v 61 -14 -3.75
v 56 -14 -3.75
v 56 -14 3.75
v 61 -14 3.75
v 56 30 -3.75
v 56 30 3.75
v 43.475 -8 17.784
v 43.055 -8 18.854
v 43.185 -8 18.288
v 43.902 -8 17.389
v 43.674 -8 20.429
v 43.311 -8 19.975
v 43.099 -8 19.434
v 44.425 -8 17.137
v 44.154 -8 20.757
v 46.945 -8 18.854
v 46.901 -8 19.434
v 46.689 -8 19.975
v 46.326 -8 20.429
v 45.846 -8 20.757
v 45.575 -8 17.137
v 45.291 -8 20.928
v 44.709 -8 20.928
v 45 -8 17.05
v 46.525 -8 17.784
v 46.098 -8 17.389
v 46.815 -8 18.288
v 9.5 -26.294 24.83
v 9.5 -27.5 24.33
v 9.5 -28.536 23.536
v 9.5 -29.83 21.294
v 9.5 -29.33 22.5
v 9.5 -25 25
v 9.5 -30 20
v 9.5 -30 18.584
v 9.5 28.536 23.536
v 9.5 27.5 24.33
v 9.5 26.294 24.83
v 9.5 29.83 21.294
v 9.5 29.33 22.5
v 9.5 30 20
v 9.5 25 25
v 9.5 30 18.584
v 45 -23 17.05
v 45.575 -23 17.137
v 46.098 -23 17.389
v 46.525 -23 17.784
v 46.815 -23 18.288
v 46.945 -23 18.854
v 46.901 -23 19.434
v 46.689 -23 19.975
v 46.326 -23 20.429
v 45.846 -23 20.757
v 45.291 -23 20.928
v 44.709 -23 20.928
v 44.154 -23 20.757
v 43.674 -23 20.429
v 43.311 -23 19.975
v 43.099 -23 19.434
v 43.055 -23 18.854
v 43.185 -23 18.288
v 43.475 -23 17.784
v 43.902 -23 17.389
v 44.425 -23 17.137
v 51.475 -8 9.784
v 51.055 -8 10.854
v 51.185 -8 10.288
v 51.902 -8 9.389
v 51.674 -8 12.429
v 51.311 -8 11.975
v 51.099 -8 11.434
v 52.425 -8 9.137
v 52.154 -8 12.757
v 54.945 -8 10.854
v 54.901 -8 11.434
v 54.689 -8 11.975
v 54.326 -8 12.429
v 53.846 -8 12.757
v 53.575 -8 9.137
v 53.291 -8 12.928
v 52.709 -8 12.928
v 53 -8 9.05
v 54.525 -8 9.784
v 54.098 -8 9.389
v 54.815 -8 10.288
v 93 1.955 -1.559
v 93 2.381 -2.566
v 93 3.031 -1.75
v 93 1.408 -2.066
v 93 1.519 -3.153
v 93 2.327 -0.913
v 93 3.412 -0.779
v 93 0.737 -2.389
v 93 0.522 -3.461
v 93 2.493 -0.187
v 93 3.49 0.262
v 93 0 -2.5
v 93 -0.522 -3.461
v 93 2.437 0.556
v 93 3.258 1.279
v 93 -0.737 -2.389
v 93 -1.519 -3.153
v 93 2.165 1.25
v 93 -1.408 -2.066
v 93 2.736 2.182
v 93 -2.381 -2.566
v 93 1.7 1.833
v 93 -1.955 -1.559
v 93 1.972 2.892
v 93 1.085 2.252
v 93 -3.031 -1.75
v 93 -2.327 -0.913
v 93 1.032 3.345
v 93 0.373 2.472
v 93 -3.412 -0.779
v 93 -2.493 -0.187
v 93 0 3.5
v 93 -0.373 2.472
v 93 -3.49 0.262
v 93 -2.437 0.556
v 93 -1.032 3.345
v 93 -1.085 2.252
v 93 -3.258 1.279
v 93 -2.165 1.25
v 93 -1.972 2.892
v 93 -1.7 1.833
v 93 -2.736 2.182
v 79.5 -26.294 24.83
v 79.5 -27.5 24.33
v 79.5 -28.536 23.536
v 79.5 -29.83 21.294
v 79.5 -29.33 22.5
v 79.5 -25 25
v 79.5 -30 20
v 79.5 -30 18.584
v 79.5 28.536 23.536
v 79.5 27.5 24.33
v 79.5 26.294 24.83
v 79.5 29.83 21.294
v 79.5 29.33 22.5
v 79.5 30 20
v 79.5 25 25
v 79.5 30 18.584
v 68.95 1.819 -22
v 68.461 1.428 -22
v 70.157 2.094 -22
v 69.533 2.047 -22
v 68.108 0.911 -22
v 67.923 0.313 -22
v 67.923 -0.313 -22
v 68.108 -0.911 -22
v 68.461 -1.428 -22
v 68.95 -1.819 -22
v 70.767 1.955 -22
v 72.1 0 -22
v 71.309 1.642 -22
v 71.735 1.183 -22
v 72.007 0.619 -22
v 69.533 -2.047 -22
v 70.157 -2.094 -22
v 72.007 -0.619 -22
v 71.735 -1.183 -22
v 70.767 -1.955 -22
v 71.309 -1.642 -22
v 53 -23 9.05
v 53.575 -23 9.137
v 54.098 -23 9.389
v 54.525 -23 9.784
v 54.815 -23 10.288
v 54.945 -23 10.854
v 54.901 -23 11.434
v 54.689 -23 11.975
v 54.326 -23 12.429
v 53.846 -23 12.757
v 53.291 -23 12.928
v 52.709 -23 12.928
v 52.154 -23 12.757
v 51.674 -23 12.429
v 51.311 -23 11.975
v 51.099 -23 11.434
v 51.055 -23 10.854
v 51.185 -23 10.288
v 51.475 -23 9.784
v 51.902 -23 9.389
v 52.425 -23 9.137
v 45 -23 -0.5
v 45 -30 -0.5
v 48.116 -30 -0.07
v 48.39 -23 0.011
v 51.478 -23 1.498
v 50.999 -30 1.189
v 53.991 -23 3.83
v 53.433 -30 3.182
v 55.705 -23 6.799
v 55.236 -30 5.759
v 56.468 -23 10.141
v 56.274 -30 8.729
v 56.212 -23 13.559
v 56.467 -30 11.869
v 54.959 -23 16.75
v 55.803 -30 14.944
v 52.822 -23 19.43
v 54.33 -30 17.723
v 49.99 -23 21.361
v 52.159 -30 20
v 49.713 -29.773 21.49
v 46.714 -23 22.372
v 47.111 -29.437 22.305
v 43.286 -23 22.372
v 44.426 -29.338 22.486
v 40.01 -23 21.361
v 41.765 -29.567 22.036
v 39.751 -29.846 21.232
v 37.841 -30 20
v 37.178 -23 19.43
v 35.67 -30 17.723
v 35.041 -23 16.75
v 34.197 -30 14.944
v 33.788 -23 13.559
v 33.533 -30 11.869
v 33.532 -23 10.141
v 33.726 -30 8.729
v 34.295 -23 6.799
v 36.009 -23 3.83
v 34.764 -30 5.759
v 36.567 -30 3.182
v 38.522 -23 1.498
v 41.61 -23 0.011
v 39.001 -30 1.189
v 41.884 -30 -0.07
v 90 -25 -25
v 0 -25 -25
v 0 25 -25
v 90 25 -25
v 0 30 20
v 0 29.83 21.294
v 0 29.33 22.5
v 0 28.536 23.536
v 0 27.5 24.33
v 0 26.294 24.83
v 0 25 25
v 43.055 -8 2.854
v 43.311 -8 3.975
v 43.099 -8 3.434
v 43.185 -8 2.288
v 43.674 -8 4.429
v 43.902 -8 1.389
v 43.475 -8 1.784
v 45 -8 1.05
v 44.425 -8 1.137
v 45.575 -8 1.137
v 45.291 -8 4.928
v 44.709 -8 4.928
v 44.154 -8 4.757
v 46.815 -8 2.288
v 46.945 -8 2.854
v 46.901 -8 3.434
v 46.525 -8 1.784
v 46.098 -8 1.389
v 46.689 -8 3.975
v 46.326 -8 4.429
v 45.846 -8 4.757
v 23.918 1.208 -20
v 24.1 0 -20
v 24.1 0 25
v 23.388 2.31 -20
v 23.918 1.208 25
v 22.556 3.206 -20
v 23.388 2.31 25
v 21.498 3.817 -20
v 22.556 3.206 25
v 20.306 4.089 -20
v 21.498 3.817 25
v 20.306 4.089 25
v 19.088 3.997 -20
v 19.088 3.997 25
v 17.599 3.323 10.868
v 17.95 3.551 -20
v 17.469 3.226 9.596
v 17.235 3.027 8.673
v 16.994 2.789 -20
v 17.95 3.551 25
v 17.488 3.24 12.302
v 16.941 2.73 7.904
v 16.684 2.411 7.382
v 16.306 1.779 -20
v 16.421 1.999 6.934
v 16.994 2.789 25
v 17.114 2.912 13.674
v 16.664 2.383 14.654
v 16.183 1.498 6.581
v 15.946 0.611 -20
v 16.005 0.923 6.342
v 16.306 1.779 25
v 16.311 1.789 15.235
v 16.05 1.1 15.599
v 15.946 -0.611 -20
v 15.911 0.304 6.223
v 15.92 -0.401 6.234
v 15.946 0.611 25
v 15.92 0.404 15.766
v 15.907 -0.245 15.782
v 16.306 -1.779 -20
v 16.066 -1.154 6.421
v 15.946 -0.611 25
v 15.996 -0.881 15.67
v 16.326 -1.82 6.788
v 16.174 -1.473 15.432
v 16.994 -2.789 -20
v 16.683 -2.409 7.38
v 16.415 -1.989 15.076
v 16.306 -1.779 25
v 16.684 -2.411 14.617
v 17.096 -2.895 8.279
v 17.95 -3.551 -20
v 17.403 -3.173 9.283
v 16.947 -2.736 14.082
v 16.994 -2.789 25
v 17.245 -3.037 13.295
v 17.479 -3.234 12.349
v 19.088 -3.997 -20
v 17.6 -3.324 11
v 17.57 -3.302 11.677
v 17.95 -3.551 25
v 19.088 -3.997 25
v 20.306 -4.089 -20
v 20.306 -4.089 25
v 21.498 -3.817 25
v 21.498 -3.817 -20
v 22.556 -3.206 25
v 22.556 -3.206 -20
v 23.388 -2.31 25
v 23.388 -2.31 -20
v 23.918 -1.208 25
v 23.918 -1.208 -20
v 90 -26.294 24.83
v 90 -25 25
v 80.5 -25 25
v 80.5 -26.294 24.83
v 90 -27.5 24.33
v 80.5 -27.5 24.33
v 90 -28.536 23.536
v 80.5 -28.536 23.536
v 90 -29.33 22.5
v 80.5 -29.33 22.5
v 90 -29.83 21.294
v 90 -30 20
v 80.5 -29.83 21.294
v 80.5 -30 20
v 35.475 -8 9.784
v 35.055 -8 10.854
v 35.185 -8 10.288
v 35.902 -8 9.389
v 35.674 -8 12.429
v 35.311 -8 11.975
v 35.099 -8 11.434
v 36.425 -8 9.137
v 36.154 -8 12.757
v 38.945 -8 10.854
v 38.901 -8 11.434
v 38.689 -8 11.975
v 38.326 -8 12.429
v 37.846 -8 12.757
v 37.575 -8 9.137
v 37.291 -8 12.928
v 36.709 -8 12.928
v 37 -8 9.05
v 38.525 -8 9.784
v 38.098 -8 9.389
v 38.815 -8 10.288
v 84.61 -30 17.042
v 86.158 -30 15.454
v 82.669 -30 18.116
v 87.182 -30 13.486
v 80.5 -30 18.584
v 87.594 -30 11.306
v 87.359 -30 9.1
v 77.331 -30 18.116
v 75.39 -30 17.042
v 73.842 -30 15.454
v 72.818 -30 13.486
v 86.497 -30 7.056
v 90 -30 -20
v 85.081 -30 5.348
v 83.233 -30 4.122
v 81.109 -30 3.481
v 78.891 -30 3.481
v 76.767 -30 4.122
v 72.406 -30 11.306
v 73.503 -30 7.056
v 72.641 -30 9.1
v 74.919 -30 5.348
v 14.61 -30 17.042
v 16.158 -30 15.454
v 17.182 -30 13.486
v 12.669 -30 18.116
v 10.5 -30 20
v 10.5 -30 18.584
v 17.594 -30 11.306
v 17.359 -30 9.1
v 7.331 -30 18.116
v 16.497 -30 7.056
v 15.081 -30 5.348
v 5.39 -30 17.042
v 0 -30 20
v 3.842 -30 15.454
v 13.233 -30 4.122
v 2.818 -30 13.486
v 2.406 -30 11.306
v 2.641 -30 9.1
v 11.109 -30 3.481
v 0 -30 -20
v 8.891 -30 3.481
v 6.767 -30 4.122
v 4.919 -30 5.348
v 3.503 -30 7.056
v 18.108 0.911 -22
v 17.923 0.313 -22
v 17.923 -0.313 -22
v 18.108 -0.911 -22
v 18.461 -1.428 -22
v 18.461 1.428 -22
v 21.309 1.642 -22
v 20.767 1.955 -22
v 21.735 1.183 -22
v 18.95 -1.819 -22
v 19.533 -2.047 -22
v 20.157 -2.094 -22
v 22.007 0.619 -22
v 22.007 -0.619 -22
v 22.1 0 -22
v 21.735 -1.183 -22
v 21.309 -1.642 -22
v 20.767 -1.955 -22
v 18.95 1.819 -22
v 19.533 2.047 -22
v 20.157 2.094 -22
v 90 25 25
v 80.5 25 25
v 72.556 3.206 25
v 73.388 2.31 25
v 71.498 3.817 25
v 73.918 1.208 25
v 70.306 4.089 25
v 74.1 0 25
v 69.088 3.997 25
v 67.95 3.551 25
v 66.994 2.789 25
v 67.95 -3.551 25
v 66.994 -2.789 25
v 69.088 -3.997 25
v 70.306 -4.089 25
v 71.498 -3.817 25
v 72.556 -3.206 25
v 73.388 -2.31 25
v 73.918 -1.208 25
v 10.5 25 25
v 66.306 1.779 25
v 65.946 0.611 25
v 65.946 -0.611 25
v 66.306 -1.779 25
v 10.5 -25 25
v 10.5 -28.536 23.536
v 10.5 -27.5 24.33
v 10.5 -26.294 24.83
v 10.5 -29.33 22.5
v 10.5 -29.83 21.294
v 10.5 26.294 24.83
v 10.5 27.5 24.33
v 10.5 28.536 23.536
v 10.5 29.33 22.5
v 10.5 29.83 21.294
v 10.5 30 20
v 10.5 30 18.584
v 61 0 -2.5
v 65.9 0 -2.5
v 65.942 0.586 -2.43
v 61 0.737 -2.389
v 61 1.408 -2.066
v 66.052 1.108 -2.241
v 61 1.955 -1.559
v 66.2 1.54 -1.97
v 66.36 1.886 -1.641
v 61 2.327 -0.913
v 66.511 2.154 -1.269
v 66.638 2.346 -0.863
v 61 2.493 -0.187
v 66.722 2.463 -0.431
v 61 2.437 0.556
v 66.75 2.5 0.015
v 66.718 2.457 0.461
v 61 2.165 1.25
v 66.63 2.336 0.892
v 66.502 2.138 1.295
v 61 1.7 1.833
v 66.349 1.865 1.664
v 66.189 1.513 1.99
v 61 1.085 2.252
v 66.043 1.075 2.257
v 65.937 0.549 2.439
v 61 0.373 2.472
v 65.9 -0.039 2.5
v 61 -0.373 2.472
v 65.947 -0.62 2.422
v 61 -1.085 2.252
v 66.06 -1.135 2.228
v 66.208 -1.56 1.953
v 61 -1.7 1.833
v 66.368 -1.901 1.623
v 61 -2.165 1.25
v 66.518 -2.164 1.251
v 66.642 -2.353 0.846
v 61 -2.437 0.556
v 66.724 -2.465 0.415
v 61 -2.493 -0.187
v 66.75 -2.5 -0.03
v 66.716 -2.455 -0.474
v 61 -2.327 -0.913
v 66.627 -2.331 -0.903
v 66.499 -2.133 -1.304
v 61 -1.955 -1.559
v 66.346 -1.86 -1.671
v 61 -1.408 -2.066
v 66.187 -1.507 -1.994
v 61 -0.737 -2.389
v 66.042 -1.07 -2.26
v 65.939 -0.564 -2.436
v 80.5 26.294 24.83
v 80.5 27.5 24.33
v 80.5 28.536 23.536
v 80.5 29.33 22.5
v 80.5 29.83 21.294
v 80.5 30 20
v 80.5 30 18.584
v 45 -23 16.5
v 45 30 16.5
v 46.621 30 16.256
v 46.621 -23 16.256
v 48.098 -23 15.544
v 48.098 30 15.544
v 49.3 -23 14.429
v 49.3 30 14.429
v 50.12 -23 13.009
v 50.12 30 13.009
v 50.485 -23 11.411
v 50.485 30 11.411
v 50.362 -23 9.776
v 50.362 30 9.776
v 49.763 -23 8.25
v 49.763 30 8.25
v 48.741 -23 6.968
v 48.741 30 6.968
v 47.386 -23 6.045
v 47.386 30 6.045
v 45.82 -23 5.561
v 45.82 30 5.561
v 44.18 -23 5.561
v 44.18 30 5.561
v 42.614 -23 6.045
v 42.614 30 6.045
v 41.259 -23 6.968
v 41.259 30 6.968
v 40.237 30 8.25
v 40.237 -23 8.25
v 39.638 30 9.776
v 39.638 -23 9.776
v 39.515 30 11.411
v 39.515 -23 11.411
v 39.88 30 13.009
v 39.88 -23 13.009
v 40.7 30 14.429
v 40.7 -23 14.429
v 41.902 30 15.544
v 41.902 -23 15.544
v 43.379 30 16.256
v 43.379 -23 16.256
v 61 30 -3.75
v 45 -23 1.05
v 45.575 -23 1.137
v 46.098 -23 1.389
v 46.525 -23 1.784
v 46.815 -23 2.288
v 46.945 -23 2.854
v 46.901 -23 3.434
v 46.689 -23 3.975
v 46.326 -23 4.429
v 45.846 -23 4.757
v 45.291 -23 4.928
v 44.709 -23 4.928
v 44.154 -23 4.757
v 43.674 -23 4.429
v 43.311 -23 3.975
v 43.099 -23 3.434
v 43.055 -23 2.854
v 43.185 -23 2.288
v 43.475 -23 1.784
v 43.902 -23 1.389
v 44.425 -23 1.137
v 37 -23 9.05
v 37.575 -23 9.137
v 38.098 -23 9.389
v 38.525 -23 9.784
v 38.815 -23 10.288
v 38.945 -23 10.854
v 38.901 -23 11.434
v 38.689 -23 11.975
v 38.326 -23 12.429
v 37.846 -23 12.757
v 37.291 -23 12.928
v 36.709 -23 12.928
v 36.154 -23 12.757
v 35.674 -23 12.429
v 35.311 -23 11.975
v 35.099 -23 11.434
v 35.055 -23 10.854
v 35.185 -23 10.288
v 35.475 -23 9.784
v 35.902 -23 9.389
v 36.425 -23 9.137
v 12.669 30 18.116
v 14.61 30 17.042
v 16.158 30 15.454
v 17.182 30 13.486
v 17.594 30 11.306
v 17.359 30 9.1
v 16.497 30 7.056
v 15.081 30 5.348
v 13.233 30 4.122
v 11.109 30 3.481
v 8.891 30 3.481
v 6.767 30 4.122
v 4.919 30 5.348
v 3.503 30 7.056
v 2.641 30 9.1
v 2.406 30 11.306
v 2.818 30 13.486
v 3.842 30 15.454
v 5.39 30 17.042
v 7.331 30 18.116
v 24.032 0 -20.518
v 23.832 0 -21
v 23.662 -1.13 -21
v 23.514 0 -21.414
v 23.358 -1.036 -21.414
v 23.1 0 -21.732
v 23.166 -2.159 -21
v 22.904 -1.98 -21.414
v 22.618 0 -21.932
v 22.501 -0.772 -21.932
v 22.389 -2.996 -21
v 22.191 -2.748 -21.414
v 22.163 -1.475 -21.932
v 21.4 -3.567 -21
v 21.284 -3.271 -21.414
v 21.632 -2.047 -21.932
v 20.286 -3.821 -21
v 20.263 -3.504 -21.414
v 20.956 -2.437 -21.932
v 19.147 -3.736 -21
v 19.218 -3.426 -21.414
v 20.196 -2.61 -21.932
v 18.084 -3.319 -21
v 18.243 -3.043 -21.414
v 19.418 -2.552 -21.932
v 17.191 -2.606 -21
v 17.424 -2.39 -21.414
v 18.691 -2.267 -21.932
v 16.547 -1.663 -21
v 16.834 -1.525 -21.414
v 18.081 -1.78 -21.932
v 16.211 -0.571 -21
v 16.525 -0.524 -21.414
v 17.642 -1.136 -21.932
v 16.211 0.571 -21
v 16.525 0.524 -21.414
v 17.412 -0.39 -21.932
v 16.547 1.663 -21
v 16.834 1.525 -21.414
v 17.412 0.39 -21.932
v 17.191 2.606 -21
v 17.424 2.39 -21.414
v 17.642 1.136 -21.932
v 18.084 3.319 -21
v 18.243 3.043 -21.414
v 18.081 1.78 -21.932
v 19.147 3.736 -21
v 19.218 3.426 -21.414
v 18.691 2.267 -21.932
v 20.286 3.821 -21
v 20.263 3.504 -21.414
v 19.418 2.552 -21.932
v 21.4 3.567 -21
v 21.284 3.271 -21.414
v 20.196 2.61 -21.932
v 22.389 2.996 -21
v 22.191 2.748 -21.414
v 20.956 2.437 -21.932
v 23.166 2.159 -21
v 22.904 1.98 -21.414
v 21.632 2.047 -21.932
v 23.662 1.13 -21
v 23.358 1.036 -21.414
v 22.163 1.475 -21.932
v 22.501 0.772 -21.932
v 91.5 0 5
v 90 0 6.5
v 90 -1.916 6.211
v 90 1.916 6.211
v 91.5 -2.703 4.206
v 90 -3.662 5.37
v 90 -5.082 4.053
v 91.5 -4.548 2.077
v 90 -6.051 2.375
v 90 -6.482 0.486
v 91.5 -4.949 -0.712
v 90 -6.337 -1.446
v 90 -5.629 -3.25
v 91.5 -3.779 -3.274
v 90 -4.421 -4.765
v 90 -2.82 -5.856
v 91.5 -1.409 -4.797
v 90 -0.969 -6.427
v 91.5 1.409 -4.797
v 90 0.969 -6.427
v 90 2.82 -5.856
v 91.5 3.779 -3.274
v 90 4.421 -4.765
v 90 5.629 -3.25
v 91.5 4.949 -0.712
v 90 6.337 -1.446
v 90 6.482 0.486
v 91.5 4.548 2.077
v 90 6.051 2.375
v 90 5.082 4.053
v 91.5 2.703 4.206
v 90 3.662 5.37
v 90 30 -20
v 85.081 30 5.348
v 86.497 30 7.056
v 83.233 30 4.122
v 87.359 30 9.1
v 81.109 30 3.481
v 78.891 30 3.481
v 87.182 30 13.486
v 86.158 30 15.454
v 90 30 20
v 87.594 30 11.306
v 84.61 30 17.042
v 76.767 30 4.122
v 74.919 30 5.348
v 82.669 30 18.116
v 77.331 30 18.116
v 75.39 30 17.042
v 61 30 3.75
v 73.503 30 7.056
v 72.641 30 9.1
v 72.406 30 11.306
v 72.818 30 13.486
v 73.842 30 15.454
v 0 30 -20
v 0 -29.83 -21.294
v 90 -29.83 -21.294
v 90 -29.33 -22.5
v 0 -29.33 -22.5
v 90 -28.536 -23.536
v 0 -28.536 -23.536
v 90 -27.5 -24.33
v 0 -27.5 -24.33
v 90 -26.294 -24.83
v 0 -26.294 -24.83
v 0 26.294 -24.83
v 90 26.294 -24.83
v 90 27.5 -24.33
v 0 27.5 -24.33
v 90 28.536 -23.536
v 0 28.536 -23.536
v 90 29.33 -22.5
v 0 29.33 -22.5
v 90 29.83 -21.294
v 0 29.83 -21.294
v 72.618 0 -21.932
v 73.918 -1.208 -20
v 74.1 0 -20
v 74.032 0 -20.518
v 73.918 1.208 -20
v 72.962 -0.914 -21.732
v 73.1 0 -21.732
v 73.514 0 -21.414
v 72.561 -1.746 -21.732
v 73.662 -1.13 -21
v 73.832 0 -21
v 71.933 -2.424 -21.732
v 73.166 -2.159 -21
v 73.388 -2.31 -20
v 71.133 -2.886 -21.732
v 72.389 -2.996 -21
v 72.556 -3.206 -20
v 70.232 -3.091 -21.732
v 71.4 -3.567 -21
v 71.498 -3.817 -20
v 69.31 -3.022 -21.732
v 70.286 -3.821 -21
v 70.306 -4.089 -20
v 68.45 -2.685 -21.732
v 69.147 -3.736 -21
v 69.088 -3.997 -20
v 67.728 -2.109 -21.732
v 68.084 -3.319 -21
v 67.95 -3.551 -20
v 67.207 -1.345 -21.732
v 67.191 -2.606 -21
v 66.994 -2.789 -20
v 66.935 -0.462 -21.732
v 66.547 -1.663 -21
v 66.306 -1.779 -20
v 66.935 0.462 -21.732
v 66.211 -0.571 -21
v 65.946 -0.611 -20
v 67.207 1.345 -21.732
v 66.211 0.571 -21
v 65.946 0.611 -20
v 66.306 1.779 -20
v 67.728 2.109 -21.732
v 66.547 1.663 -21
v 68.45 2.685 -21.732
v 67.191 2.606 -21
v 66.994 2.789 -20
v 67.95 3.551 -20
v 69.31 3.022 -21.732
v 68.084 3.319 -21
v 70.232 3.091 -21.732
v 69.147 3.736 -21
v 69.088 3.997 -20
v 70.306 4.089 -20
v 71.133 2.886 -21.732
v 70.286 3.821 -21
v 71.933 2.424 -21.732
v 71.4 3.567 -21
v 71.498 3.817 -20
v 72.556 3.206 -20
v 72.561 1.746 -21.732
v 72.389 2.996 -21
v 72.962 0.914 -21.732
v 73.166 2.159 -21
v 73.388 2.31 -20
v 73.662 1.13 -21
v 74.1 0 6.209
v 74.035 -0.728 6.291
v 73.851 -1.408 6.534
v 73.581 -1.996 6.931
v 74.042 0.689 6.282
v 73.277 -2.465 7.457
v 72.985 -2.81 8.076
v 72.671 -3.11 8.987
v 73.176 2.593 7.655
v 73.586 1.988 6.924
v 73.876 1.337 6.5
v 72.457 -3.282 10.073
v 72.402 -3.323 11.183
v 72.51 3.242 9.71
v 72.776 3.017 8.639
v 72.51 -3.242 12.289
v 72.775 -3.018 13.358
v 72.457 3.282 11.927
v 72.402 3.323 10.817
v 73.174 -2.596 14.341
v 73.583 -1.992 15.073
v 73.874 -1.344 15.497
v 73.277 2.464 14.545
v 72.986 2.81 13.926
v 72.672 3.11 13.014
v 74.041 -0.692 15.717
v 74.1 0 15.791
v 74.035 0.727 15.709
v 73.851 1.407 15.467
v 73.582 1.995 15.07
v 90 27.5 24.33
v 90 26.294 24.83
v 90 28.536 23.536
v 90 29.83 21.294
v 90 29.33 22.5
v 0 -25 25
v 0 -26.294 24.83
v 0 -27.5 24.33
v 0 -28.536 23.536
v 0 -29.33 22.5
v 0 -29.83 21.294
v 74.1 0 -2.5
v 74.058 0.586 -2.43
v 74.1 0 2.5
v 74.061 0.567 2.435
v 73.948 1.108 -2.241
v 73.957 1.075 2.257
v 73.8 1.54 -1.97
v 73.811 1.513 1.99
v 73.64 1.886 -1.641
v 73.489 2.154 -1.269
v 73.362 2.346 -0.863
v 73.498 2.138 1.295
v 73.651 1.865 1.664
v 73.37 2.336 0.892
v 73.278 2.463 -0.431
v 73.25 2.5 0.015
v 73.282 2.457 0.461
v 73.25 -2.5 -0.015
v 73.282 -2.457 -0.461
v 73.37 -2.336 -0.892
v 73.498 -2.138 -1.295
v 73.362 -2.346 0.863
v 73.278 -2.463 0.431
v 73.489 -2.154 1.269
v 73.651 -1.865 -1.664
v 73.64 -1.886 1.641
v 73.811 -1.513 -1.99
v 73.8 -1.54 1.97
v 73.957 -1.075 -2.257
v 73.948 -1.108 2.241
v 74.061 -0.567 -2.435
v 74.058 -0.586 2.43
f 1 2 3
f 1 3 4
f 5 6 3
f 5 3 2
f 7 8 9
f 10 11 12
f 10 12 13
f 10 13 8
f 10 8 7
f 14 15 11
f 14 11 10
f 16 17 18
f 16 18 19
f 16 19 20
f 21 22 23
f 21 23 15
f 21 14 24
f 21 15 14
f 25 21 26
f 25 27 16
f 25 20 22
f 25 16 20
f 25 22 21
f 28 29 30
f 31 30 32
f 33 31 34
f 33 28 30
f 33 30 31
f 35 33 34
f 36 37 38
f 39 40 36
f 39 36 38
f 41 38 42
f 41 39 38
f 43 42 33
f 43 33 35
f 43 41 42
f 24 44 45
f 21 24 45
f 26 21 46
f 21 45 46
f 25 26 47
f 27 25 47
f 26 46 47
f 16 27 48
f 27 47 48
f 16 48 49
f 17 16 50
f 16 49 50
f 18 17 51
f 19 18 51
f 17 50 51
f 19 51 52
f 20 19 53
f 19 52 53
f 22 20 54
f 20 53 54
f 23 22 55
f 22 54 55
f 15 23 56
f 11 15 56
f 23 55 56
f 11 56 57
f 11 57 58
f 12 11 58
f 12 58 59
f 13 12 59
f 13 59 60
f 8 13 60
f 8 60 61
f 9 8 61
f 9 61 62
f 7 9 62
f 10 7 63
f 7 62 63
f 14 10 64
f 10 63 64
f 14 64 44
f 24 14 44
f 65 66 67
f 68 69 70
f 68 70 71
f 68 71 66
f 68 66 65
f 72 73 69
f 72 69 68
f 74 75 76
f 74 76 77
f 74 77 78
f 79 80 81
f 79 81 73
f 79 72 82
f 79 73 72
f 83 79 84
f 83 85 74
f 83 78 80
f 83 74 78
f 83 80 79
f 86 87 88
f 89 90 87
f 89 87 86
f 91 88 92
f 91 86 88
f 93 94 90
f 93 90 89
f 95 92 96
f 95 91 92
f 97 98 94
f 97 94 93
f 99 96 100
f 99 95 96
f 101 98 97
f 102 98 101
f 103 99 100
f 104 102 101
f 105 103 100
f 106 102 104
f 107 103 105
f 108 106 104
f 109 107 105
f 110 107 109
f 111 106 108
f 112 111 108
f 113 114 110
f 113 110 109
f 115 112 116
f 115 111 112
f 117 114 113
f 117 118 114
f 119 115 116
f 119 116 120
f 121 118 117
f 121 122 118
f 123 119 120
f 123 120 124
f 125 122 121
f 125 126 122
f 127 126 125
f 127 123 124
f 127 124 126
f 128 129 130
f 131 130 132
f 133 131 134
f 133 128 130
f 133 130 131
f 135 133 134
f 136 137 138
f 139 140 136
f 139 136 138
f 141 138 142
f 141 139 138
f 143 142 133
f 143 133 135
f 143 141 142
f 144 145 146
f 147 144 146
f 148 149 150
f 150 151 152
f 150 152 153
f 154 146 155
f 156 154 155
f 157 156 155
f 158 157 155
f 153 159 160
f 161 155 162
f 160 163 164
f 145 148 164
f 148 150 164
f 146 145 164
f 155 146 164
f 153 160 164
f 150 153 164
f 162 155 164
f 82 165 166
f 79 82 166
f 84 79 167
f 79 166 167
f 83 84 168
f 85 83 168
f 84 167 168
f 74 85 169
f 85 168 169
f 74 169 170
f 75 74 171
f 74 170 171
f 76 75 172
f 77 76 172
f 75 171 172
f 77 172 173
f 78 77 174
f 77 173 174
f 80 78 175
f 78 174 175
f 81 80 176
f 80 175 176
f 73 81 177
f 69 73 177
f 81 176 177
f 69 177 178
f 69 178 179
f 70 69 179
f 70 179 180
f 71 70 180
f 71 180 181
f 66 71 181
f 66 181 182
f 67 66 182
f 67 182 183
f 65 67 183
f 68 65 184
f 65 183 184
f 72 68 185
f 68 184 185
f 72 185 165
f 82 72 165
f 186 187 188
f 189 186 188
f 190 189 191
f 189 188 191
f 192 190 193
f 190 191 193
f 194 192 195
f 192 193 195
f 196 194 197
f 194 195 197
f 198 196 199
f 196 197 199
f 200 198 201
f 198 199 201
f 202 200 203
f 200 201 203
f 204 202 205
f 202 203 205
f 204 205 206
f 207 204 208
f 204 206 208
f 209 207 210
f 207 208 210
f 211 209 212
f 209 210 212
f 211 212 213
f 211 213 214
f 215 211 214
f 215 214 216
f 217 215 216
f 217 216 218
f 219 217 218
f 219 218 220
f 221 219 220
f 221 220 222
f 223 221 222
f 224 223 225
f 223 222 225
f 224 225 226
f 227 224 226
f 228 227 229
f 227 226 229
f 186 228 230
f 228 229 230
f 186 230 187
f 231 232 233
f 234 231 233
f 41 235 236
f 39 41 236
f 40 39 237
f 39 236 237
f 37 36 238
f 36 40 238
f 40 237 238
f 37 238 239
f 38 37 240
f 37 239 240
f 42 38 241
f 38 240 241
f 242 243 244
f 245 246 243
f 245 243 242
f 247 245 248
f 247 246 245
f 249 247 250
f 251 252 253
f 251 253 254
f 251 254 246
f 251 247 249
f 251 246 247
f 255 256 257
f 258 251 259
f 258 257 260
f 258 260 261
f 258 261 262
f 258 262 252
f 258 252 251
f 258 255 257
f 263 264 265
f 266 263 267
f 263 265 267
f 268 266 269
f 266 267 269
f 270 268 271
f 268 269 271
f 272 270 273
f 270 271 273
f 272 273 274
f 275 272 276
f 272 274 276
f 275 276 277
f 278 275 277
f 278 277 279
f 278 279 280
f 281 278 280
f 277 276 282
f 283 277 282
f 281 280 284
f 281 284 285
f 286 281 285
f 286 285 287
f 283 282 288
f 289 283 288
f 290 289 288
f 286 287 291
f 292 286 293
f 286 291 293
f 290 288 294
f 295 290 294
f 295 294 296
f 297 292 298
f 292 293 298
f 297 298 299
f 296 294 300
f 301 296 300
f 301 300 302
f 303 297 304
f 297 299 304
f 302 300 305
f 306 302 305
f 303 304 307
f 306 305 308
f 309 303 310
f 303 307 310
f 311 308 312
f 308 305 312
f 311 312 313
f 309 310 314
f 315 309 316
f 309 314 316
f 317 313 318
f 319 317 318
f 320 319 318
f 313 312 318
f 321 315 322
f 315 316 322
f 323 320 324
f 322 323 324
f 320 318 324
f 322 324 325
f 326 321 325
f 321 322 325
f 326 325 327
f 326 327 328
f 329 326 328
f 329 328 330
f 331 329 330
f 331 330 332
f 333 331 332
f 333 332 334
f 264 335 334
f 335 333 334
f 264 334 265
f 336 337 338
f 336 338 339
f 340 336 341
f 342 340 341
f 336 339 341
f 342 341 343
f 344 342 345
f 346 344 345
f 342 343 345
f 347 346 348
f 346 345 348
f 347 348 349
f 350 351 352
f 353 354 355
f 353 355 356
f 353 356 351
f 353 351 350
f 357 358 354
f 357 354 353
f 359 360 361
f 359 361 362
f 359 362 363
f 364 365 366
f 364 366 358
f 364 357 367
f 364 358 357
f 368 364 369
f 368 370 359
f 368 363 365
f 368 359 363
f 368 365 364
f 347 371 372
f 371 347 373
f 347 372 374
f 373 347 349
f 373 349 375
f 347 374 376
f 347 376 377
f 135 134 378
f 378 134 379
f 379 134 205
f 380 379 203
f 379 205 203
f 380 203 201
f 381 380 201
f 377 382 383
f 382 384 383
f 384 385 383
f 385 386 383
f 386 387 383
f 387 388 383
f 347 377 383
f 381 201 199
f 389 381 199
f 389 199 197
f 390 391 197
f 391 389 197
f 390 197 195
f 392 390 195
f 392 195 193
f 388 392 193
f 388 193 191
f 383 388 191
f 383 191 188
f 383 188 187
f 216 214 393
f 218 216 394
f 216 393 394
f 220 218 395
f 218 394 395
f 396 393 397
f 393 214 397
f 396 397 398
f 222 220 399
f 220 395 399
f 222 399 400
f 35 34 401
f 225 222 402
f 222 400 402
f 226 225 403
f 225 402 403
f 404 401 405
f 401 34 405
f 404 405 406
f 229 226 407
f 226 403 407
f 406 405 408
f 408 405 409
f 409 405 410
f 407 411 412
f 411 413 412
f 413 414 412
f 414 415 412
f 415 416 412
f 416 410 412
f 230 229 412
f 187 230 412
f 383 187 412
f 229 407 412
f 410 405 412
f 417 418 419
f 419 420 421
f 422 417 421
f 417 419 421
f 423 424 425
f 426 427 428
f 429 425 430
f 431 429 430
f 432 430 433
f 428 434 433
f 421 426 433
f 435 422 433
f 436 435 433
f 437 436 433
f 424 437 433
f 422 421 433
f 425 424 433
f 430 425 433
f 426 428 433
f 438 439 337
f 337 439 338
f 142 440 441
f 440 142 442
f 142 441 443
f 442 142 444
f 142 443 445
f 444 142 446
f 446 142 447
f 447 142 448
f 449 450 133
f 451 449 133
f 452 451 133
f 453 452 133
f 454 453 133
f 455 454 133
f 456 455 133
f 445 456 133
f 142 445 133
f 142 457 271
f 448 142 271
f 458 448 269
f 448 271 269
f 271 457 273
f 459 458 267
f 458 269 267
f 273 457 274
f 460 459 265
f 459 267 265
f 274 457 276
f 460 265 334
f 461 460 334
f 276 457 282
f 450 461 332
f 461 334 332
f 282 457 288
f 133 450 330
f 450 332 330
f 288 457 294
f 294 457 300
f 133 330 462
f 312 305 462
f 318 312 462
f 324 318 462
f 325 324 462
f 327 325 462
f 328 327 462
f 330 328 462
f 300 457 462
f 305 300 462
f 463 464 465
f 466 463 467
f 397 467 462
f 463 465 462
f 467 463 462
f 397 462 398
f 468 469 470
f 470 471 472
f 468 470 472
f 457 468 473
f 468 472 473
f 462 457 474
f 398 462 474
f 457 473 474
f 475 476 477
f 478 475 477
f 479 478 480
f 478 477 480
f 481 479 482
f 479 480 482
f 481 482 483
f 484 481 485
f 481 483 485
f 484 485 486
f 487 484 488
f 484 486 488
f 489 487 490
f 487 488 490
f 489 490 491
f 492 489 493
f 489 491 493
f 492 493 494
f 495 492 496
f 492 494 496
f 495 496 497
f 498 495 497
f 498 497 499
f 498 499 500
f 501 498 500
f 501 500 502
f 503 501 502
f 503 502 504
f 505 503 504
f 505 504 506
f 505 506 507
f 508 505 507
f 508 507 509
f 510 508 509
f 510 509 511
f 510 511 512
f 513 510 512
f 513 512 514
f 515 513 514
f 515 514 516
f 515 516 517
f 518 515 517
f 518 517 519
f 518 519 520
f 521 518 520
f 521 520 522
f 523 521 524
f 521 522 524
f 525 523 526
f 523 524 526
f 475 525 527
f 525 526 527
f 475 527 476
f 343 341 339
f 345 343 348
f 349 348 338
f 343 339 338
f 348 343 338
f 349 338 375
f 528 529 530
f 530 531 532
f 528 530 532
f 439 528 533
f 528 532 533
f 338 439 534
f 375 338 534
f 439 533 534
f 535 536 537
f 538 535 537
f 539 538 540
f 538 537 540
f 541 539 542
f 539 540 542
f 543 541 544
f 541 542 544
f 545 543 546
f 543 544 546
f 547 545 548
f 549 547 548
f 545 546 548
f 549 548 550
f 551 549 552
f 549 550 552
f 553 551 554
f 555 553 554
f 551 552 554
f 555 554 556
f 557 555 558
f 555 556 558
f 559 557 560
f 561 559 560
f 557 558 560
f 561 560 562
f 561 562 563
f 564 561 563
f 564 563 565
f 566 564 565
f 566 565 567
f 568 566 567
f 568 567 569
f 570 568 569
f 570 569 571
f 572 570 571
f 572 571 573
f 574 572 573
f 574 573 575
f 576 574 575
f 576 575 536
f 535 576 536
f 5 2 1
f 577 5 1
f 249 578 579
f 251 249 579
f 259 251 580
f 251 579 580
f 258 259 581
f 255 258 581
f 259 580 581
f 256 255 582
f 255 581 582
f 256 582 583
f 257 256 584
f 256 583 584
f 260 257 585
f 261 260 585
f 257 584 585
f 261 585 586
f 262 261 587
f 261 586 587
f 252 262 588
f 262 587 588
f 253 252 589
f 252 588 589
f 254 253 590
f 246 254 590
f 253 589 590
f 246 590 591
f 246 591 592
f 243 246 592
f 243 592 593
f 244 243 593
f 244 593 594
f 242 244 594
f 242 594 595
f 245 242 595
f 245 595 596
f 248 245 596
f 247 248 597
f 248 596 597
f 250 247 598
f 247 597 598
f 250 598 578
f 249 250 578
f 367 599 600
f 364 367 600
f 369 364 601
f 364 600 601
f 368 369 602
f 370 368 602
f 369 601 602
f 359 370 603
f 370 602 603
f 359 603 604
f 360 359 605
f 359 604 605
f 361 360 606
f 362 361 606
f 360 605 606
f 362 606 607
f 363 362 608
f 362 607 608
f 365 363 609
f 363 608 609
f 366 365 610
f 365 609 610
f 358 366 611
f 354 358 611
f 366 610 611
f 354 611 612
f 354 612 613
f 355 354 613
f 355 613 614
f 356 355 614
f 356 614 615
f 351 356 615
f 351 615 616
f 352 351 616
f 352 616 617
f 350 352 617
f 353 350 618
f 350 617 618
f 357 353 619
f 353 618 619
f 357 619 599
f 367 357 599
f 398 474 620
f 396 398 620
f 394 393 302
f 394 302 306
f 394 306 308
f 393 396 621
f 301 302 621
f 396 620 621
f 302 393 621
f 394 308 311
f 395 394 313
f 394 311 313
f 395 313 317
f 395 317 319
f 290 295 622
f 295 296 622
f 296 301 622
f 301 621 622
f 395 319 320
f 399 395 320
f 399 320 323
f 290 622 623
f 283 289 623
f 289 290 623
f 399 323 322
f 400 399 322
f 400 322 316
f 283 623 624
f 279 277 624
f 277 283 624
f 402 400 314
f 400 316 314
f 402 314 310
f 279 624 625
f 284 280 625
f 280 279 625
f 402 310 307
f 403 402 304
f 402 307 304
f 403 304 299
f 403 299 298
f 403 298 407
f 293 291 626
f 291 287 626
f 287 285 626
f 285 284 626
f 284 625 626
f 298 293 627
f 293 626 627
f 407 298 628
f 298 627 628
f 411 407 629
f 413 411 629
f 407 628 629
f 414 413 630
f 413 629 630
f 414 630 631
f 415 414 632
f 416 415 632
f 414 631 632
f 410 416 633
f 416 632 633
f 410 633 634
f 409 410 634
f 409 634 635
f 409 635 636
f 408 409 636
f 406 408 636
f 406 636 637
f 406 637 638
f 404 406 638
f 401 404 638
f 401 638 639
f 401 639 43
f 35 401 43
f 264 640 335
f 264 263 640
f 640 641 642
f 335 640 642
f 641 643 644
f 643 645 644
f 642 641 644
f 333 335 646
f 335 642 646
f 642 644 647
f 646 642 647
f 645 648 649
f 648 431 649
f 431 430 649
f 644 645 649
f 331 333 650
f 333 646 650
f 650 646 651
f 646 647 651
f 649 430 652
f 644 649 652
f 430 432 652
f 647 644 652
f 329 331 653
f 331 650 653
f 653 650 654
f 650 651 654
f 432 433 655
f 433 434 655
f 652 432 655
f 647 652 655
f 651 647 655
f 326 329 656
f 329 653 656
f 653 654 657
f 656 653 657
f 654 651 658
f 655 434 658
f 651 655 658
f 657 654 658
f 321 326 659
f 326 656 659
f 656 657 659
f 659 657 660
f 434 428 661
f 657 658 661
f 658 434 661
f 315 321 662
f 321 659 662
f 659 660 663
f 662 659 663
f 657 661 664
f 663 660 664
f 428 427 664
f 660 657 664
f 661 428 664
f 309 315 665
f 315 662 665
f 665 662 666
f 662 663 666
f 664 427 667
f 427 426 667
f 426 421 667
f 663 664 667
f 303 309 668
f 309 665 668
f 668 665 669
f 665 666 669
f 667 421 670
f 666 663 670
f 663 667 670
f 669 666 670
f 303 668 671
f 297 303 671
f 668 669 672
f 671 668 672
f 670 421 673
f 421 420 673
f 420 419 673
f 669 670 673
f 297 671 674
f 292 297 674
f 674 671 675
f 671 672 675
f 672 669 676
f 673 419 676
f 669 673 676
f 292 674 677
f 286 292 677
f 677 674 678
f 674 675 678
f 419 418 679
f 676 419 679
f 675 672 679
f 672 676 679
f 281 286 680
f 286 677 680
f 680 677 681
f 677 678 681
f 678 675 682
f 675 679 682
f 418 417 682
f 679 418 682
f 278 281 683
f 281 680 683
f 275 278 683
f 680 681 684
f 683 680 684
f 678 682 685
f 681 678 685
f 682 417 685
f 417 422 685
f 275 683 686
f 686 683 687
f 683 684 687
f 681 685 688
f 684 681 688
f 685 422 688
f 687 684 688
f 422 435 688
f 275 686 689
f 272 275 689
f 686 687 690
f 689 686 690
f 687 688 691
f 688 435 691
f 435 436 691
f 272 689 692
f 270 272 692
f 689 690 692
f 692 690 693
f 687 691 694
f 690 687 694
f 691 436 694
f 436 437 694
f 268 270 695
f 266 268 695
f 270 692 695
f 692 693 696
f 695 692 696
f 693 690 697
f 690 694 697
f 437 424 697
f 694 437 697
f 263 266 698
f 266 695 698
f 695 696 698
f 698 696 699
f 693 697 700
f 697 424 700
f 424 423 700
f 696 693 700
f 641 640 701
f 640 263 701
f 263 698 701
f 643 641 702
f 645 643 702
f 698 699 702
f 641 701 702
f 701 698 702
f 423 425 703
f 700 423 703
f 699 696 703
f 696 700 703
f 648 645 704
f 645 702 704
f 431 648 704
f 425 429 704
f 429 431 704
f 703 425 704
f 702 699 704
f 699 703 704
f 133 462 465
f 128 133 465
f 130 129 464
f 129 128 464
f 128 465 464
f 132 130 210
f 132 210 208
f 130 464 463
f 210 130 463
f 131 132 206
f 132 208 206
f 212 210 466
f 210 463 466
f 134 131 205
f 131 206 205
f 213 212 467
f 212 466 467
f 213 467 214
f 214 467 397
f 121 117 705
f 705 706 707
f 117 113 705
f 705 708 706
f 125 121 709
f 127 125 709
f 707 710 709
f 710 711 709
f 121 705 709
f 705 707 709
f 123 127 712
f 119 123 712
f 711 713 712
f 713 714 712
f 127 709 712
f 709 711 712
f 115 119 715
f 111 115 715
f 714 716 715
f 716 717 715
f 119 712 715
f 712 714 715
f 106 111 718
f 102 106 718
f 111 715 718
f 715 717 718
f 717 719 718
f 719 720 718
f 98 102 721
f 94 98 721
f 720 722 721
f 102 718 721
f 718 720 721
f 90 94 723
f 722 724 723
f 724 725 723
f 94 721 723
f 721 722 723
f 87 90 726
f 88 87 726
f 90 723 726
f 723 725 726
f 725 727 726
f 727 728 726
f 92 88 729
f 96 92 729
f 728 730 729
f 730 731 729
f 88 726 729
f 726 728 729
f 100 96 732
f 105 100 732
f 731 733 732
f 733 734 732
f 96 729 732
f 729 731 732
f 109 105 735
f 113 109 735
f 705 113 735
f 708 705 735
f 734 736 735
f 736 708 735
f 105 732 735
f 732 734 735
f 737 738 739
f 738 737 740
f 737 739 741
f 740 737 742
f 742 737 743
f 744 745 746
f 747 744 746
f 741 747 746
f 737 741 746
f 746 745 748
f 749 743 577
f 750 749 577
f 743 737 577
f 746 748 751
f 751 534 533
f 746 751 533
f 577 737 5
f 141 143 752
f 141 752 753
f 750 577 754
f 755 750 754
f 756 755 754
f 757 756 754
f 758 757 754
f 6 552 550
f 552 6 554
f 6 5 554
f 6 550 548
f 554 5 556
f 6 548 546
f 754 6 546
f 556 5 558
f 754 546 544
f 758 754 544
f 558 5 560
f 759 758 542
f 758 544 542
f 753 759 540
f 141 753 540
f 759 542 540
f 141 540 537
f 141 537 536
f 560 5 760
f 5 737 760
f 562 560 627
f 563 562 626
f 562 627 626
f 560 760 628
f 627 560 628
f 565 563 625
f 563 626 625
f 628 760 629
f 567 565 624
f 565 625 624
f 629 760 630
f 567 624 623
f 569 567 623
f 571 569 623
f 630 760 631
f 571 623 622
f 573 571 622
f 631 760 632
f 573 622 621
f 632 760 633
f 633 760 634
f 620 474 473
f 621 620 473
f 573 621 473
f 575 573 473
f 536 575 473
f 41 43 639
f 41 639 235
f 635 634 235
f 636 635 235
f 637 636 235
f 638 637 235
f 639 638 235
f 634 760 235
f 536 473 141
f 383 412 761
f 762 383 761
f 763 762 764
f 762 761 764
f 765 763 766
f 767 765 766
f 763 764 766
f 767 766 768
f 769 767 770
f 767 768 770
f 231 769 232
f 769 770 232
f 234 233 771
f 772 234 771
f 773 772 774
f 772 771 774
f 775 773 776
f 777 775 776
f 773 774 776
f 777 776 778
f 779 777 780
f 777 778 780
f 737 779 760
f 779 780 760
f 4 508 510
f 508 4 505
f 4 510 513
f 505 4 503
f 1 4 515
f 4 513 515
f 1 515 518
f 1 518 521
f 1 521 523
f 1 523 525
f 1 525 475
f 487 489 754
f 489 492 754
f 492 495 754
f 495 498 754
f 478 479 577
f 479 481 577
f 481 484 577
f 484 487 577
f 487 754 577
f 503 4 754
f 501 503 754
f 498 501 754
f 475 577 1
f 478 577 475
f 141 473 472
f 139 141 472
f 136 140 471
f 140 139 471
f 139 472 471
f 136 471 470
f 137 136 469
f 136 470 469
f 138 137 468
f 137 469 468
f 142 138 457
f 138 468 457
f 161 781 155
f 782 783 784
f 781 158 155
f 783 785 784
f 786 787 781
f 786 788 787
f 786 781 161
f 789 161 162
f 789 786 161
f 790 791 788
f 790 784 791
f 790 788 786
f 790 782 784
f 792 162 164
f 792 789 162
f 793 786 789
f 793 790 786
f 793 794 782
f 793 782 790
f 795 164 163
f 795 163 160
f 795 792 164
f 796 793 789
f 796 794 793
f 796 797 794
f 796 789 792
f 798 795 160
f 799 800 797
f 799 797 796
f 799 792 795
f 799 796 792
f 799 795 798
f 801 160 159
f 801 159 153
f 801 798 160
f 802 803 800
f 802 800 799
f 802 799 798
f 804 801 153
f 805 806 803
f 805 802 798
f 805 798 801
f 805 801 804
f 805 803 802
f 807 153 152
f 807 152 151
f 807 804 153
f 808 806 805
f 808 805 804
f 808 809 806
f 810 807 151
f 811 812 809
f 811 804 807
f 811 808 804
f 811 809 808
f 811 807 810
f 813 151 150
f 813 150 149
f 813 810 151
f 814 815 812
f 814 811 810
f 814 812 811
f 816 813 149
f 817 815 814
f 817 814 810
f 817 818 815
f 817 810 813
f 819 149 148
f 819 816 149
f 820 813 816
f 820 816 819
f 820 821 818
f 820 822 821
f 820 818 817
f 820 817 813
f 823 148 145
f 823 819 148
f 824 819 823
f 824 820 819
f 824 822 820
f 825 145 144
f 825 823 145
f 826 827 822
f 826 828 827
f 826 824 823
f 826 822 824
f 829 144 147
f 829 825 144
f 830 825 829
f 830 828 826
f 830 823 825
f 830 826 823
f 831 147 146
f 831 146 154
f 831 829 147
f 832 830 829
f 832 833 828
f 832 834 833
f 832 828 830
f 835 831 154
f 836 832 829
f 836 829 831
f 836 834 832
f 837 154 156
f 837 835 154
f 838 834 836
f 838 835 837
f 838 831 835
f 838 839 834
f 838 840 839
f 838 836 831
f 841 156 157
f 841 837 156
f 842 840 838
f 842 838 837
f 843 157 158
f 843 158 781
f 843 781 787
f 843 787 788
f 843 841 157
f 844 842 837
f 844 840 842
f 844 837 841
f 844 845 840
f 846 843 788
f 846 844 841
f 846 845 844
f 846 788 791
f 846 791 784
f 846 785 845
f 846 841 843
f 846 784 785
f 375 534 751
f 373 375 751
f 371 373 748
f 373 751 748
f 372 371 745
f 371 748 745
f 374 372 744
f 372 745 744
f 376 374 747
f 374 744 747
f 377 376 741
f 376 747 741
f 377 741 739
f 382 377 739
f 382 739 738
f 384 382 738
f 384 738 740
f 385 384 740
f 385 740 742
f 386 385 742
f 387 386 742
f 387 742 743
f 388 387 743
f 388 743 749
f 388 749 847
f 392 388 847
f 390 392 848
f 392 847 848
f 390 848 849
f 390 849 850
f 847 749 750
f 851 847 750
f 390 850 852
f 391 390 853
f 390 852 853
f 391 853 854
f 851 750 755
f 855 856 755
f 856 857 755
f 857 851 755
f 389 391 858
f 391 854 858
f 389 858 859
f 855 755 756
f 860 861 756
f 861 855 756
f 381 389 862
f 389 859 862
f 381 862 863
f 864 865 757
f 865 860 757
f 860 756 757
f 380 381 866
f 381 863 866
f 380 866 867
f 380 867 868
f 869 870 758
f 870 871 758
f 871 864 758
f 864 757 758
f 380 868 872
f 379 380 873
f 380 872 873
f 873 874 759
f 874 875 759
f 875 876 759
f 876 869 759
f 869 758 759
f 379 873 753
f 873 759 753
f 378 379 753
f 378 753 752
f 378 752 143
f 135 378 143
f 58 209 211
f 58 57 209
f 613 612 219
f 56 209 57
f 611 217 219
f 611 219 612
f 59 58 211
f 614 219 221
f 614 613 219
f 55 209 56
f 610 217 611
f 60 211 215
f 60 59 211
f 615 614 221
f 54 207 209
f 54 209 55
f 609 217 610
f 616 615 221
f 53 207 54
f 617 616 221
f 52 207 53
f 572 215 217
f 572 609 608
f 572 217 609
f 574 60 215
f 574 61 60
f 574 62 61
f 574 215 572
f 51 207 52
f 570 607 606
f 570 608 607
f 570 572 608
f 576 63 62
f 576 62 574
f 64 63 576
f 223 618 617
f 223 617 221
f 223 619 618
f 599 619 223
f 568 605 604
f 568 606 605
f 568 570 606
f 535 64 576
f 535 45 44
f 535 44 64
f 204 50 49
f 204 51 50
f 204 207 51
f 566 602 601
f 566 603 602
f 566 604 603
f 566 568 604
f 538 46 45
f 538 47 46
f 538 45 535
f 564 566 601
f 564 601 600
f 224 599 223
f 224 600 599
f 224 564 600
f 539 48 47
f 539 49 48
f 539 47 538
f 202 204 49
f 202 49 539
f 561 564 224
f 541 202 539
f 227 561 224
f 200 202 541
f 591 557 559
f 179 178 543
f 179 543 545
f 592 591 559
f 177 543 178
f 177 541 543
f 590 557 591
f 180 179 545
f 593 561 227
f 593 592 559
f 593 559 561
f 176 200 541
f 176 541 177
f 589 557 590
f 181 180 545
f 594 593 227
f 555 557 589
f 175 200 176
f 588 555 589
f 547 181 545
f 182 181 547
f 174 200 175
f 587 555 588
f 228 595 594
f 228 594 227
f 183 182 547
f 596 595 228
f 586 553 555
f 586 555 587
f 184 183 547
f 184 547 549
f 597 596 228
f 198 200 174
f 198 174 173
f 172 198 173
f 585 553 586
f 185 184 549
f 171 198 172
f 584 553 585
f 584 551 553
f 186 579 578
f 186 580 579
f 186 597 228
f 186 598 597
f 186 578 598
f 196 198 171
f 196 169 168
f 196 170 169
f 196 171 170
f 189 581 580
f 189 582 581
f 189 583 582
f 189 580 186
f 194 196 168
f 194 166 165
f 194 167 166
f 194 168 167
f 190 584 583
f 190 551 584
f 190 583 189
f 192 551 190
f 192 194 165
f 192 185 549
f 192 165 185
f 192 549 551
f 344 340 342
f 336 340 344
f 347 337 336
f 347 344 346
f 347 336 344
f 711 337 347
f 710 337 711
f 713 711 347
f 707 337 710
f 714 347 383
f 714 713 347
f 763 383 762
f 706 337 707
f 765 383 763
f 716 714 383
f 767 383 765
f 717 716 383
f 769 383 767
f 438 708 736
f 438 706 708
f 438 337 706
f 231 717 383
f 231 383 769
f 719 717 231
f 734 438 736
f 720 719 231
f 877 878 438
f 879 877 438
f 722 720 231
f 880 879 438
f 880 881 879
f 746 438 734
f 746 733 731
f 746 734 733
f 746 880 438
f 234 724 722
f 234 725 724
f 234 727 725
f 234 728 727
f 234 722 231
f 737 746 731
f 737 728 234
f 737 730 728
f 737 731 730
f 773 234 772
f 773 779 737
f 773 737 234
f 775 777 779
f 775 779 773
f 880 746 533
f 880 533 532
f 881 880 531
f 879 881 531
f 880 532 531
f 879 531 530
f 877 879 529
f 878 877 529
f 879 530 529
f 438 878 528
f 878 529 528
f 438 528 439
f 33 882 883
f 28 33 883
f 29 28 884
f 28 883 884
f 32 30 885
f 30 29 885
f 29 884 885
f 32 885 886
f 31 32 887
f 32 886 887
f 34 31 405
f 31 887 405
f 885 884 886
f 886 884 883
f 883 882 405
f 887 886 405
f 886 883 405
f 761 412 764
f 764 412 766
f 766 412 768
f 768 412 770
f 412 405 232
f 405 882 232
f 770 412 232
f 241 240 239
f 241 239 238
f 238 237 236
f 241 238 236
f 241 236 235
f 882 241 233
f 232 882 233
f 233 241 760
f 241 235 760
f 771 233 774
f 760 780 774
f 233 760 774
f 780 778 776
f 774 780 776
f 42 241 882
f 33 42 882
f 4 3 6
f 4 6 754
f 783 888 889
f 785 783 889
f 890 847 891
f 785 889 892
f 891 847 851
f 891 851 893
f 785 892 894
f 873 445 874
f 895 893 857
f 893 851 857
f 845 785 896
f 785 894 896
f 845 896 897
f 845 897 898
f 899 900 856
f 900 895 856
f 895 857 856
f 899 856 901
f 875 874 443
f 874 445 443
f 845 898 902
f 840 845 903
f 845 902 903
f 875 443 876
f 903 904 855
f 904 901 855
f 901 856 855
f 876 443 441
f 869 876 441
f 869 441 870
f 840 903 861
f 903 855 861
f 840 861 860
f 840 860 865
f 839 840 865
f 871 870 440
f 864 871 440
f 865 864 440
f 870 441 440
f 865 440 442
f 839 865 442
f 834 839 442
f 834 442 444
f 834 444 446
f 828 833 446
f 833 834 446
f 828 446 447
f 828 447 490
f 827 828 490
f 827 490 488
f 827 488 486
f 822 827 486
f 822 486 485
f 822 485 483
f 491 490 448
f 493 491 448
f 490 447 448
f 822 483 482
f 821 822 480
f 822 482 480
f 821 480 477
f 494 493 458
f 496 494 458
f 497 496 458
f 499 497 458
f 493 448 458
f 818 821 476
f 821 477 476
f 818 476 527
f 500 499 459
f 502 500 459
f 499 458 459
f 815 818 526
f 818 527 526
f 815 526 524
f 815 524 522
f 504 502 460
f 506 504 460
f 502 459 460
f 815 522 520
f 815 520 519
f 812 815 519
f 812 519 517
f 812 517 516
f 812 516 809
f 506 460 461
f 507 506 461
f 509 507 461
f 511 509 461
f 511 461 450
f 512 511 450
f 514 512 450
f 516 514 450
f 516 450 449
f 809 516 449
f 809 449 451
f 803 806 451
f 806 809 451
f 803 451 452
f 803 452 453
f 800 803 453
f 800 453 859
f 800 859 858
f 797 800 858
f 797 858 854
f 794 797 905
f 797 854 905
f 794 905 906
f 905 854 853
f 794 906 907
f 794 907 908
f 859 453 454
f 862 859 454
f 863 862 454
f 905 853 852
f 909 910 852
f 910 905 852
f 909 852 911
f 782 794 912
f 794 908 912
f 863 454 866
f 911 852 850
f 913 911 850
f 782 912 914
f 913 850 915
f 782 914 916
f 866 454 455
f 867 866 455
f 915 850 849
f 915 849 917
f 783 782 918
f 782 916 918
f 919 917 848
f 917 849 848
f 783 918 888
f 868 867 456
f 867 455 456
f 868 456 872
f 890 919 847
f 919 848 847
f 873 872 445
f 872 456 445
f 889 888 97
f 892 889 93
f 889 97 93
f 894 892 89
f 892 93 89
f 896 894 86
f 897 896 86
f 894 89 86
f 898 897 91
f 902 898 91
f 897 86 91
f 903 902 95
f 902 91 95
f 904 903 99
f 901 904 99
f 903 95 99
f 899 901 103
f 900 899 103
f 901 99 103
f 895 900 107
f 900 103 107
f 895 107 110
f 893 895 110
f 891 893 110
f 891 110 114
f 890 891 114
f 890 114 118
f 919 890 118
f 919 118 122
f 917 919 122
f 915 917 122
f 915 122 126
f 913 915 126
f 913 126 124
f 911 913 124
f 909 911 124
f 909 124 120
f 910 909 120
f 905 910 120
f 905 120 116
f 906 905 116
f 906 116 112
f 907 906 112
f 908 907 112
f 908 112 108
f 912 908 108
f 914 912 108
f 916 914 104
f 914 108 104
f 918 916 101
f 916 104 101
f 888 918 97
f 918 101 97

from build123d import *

# Parameters (mm, degrees)
BOSS_EXTRUDE1_DEPTH     = 90
SKETCH2_R               = 7.6
SKETCH2_R_2             = 5.5
CUT_EXTRUDE1_DEPTH      = 90
SKETCH3_R               = 4.1
CUT_EXTRUDE2_DEPTH      = 90
SKETCH10_W              = 1
SKETCH10_H              = 31.35052841
CUT_EXTRUDE_THIN1_DEPTH = 70
SKETCH11_R              = 11.5
CUT_EXTRUDE6_DEPTH      = 7
SKETCH12_R              = 1.95
CUT_EXTRUDE7_DEPTH      = 15
BOSS_EXTRUDE2_START     = -3
SKETCH16_R              = 4.1
BOSS_EXTRUDE2_DEPTH     = 3
FILLET1_R               = 2
SKETCH17_R              = 2.5
CUT_EXTRUDE8_DEPTH      = 30
SKETCH18_W              = 5
SKETCH18_H              = 7.5
CUT_EXTRUDE9_DEPTH      = 44
BOSS_EXTRUDE3_START     = 3
SKETCH19_R              = 3.5
SKETCH19_R_2            = 2.5
BOSS_EXTRUDE3_DEPTH     = 3
CHAMFER1_SIZE           = 3


with BuildPart() as part:
    # Sketch1 → Boss-Extrude1 (new body)
    with BuildSketch(Plane(origin=(0, 0, 0), x_dir=(0, 0, -1), z_dir=(1, 0, 0))):
        with BuildLine():
            Line((-20, -30), (20, -30))
            ThreePointArc((20, -30), (23.535533906, -28.535533906), (25, -25))
            Line((25, -25), (25, 25))
            ThreePointArc((25, 25), (23.535533906, 28.535533906), (20, 30))
            Line((20, 30), (-20, 30))
            ThreePointArc((-20, 30), (-23.535533906, 28.535533906), (-25, 25))
            Line((-25, 25), (-25, -25))
            ThreePointArc((-25, -25), (-23.535533906, -28.535533906), (-20, -30))
        make_face()
    extrude(amount=BOSS_EXTRUDE1_DEPTH)

    # Sketch2 → Cut-Extrude1 (cut)
    with BuildSketch(Plane(origin=(0, 30, 0), x_dir=(1, 0, 0), z_dir=(0, 1, 0))):
        with Locations(Location((10, -11, 0), (0, 0, 270))):
            Circle(SKETCH2_R)
        with Locations(Location((80, -11, 0), (0, 0, 270))):
            Circle(SKETCH2_R)
        with Locations(Location((45, -11, 0), (0, 0, 270))):
            Circle(SKETCH2_R_2)
    extrude(amount=-CUT_EXTRUDE1_DEPTH, mode=Mode.SUBTRACT)

    # Sketch3 → Cut-Extrude2 (cut)
    with BuildSketch(Plane.XY.offset(25)):
        with Locations((20, 0)):
            Circle(SKETCH3_R)
        with Locations((70, 0)):
            Circle(SKETCH3_R)
    extrude(amount=-CUT_EXTRUDE2_DEPTH, mode=Mode.SUBTRACT)

    # Sketch10 → Cut-Extrude-Thin1 (cut)
    with BuildSketch(Plane(origin=(0, 30, 0), x_dir=(1, 0, 0), z_dir=(0, 1, 0))):
        with Locations((10, -26.675264205)):
            Rectangle(SKETCH10_W, SKETCH10_H)
        with Locations((80, -26.675264205)):
            Rectangle(SKETCH10_W, SKETCH10_H)
    extrude(amount=-CUT_EXTRUDE_THIN1_DEPTH, mode=Mode.SUBTRACT)

    # Sketch11 → Cut-Extrude6 (cut)
    with BuildSketch(Plane(origin=(0, -30, 0), x_dir=(-1, 0, 0), z_dir=(0, -1, 0))):
        with Locations(Location((-45, -11, 0), (0, 0, 90))):
            Circle(SKETCH11_R)
    extrude(amount=-CUT_EXTRUDE6_DEPTH, mode=Mode.SUBTRACT)

    # Sketch12 → Cut-Extrude7 (cut)
    with BuildSketch(Plane(origin=(0, -23, 0), x_dir=(-1, 0, 0), z_dir=(0, -1, 0))):
        with Locations(Location((-45, -19, 0), (0, 0, 90))):
            Circle(SKETCH12_R)
        with Locations(Location((-53, -11, 0), (0, 0, 90))):
            Circle(SKETCH12_R)
        with Locations(Location((-45, -3, 0), (0, 0, 90))):
            Circle(SKETCH12_R)
        with Locations(Location((-37, -11, 0), (0, 0, 90))):
            Circle(SKETCH12_R)
    extrude(amount=-CUT_EXTRUDE7_DEPTH, mode=Mode.SUBTRACT)

    # Sketch16 → Boss-Extrude2 (add)
    with BuildSketch(Plane(origin=(0, 0, -25), x_dir=(-1, 0, 0), z_dir=(0, 0, -1)).offset(BOSS_EXTRUDE2_START)):
        with Locations(Location((-70, 0, 0), (0, 0, 180))):
            Circle(SKETCH16_R)
        with Locations(Location((-20, 0, 0), (0, 0, 180))):
            Circle(SKETCH16_R)
    extrude(amount=BOSS_EXTRUDE2_DEPTH)

    # Fillet1
    fillet1_edges = [part.edges().sort_by_distance(p)[0] for p in [
        (65.9, 0, -22),
        (15.9, 0, -22),
    ]]
    fillet(fillet1_edges, radius=FILLET1_R)

    # Sketch17 → Cut-Extrude8 (cut)
    with BuildSketch(Plane(origin=(90, 0, 0), x_dir=(0, 0, -1), z_dir=(1, 0, 0))):
        Circle(SKETCH17_R)
    extrude(amount=-CUT_EXTRUDE8_DEPTH, mode=Mode.SUBTRACT)

    # Sketch18 → Cut-Extrude9 (cut)
    with BuildSketch(Plane(origin=(0, 30, 0), x_dir=(1, 0, 0), z_dir=(0, 1, 0))):
        with Locations((58.5, 0)):
            Rectangle(SKETCH18_W, SKETCH18_H)
    extrude(amount=-CUT_EXTRUDE9_DEPTH, mode=Mode.SUBTRACT)

    # Sketch19 → Boss-Extrude3 (add)
    with BuildSketch(Plane(origin=(90, 0, 0), x_dir=(0, 0, -1), z_dir=(1, 0, 0)).offset(BOSS_EXTRUDE3_START)):
        with Locations(Location((0, 0, 0), (0, 0, 180))):
            Circle(SKETCH19_R)
        Circle(SKETCH19_R_2, mode=Mode.SUBTRACT)
    extrude(amount=-BOSS_EXTRUDE3_DEPTH)

    # Chamfer1
    chamfer1_edges = [part.edges().sort_by_distance(p)[0] for p in [
        (90, 0, -3.5),
    ]]
    chamfer(chamfer1_edges, length=CHAMFER1_SIZE - 0.0001)  # a hair under: the kernel refuses the full size


solid = part.part
